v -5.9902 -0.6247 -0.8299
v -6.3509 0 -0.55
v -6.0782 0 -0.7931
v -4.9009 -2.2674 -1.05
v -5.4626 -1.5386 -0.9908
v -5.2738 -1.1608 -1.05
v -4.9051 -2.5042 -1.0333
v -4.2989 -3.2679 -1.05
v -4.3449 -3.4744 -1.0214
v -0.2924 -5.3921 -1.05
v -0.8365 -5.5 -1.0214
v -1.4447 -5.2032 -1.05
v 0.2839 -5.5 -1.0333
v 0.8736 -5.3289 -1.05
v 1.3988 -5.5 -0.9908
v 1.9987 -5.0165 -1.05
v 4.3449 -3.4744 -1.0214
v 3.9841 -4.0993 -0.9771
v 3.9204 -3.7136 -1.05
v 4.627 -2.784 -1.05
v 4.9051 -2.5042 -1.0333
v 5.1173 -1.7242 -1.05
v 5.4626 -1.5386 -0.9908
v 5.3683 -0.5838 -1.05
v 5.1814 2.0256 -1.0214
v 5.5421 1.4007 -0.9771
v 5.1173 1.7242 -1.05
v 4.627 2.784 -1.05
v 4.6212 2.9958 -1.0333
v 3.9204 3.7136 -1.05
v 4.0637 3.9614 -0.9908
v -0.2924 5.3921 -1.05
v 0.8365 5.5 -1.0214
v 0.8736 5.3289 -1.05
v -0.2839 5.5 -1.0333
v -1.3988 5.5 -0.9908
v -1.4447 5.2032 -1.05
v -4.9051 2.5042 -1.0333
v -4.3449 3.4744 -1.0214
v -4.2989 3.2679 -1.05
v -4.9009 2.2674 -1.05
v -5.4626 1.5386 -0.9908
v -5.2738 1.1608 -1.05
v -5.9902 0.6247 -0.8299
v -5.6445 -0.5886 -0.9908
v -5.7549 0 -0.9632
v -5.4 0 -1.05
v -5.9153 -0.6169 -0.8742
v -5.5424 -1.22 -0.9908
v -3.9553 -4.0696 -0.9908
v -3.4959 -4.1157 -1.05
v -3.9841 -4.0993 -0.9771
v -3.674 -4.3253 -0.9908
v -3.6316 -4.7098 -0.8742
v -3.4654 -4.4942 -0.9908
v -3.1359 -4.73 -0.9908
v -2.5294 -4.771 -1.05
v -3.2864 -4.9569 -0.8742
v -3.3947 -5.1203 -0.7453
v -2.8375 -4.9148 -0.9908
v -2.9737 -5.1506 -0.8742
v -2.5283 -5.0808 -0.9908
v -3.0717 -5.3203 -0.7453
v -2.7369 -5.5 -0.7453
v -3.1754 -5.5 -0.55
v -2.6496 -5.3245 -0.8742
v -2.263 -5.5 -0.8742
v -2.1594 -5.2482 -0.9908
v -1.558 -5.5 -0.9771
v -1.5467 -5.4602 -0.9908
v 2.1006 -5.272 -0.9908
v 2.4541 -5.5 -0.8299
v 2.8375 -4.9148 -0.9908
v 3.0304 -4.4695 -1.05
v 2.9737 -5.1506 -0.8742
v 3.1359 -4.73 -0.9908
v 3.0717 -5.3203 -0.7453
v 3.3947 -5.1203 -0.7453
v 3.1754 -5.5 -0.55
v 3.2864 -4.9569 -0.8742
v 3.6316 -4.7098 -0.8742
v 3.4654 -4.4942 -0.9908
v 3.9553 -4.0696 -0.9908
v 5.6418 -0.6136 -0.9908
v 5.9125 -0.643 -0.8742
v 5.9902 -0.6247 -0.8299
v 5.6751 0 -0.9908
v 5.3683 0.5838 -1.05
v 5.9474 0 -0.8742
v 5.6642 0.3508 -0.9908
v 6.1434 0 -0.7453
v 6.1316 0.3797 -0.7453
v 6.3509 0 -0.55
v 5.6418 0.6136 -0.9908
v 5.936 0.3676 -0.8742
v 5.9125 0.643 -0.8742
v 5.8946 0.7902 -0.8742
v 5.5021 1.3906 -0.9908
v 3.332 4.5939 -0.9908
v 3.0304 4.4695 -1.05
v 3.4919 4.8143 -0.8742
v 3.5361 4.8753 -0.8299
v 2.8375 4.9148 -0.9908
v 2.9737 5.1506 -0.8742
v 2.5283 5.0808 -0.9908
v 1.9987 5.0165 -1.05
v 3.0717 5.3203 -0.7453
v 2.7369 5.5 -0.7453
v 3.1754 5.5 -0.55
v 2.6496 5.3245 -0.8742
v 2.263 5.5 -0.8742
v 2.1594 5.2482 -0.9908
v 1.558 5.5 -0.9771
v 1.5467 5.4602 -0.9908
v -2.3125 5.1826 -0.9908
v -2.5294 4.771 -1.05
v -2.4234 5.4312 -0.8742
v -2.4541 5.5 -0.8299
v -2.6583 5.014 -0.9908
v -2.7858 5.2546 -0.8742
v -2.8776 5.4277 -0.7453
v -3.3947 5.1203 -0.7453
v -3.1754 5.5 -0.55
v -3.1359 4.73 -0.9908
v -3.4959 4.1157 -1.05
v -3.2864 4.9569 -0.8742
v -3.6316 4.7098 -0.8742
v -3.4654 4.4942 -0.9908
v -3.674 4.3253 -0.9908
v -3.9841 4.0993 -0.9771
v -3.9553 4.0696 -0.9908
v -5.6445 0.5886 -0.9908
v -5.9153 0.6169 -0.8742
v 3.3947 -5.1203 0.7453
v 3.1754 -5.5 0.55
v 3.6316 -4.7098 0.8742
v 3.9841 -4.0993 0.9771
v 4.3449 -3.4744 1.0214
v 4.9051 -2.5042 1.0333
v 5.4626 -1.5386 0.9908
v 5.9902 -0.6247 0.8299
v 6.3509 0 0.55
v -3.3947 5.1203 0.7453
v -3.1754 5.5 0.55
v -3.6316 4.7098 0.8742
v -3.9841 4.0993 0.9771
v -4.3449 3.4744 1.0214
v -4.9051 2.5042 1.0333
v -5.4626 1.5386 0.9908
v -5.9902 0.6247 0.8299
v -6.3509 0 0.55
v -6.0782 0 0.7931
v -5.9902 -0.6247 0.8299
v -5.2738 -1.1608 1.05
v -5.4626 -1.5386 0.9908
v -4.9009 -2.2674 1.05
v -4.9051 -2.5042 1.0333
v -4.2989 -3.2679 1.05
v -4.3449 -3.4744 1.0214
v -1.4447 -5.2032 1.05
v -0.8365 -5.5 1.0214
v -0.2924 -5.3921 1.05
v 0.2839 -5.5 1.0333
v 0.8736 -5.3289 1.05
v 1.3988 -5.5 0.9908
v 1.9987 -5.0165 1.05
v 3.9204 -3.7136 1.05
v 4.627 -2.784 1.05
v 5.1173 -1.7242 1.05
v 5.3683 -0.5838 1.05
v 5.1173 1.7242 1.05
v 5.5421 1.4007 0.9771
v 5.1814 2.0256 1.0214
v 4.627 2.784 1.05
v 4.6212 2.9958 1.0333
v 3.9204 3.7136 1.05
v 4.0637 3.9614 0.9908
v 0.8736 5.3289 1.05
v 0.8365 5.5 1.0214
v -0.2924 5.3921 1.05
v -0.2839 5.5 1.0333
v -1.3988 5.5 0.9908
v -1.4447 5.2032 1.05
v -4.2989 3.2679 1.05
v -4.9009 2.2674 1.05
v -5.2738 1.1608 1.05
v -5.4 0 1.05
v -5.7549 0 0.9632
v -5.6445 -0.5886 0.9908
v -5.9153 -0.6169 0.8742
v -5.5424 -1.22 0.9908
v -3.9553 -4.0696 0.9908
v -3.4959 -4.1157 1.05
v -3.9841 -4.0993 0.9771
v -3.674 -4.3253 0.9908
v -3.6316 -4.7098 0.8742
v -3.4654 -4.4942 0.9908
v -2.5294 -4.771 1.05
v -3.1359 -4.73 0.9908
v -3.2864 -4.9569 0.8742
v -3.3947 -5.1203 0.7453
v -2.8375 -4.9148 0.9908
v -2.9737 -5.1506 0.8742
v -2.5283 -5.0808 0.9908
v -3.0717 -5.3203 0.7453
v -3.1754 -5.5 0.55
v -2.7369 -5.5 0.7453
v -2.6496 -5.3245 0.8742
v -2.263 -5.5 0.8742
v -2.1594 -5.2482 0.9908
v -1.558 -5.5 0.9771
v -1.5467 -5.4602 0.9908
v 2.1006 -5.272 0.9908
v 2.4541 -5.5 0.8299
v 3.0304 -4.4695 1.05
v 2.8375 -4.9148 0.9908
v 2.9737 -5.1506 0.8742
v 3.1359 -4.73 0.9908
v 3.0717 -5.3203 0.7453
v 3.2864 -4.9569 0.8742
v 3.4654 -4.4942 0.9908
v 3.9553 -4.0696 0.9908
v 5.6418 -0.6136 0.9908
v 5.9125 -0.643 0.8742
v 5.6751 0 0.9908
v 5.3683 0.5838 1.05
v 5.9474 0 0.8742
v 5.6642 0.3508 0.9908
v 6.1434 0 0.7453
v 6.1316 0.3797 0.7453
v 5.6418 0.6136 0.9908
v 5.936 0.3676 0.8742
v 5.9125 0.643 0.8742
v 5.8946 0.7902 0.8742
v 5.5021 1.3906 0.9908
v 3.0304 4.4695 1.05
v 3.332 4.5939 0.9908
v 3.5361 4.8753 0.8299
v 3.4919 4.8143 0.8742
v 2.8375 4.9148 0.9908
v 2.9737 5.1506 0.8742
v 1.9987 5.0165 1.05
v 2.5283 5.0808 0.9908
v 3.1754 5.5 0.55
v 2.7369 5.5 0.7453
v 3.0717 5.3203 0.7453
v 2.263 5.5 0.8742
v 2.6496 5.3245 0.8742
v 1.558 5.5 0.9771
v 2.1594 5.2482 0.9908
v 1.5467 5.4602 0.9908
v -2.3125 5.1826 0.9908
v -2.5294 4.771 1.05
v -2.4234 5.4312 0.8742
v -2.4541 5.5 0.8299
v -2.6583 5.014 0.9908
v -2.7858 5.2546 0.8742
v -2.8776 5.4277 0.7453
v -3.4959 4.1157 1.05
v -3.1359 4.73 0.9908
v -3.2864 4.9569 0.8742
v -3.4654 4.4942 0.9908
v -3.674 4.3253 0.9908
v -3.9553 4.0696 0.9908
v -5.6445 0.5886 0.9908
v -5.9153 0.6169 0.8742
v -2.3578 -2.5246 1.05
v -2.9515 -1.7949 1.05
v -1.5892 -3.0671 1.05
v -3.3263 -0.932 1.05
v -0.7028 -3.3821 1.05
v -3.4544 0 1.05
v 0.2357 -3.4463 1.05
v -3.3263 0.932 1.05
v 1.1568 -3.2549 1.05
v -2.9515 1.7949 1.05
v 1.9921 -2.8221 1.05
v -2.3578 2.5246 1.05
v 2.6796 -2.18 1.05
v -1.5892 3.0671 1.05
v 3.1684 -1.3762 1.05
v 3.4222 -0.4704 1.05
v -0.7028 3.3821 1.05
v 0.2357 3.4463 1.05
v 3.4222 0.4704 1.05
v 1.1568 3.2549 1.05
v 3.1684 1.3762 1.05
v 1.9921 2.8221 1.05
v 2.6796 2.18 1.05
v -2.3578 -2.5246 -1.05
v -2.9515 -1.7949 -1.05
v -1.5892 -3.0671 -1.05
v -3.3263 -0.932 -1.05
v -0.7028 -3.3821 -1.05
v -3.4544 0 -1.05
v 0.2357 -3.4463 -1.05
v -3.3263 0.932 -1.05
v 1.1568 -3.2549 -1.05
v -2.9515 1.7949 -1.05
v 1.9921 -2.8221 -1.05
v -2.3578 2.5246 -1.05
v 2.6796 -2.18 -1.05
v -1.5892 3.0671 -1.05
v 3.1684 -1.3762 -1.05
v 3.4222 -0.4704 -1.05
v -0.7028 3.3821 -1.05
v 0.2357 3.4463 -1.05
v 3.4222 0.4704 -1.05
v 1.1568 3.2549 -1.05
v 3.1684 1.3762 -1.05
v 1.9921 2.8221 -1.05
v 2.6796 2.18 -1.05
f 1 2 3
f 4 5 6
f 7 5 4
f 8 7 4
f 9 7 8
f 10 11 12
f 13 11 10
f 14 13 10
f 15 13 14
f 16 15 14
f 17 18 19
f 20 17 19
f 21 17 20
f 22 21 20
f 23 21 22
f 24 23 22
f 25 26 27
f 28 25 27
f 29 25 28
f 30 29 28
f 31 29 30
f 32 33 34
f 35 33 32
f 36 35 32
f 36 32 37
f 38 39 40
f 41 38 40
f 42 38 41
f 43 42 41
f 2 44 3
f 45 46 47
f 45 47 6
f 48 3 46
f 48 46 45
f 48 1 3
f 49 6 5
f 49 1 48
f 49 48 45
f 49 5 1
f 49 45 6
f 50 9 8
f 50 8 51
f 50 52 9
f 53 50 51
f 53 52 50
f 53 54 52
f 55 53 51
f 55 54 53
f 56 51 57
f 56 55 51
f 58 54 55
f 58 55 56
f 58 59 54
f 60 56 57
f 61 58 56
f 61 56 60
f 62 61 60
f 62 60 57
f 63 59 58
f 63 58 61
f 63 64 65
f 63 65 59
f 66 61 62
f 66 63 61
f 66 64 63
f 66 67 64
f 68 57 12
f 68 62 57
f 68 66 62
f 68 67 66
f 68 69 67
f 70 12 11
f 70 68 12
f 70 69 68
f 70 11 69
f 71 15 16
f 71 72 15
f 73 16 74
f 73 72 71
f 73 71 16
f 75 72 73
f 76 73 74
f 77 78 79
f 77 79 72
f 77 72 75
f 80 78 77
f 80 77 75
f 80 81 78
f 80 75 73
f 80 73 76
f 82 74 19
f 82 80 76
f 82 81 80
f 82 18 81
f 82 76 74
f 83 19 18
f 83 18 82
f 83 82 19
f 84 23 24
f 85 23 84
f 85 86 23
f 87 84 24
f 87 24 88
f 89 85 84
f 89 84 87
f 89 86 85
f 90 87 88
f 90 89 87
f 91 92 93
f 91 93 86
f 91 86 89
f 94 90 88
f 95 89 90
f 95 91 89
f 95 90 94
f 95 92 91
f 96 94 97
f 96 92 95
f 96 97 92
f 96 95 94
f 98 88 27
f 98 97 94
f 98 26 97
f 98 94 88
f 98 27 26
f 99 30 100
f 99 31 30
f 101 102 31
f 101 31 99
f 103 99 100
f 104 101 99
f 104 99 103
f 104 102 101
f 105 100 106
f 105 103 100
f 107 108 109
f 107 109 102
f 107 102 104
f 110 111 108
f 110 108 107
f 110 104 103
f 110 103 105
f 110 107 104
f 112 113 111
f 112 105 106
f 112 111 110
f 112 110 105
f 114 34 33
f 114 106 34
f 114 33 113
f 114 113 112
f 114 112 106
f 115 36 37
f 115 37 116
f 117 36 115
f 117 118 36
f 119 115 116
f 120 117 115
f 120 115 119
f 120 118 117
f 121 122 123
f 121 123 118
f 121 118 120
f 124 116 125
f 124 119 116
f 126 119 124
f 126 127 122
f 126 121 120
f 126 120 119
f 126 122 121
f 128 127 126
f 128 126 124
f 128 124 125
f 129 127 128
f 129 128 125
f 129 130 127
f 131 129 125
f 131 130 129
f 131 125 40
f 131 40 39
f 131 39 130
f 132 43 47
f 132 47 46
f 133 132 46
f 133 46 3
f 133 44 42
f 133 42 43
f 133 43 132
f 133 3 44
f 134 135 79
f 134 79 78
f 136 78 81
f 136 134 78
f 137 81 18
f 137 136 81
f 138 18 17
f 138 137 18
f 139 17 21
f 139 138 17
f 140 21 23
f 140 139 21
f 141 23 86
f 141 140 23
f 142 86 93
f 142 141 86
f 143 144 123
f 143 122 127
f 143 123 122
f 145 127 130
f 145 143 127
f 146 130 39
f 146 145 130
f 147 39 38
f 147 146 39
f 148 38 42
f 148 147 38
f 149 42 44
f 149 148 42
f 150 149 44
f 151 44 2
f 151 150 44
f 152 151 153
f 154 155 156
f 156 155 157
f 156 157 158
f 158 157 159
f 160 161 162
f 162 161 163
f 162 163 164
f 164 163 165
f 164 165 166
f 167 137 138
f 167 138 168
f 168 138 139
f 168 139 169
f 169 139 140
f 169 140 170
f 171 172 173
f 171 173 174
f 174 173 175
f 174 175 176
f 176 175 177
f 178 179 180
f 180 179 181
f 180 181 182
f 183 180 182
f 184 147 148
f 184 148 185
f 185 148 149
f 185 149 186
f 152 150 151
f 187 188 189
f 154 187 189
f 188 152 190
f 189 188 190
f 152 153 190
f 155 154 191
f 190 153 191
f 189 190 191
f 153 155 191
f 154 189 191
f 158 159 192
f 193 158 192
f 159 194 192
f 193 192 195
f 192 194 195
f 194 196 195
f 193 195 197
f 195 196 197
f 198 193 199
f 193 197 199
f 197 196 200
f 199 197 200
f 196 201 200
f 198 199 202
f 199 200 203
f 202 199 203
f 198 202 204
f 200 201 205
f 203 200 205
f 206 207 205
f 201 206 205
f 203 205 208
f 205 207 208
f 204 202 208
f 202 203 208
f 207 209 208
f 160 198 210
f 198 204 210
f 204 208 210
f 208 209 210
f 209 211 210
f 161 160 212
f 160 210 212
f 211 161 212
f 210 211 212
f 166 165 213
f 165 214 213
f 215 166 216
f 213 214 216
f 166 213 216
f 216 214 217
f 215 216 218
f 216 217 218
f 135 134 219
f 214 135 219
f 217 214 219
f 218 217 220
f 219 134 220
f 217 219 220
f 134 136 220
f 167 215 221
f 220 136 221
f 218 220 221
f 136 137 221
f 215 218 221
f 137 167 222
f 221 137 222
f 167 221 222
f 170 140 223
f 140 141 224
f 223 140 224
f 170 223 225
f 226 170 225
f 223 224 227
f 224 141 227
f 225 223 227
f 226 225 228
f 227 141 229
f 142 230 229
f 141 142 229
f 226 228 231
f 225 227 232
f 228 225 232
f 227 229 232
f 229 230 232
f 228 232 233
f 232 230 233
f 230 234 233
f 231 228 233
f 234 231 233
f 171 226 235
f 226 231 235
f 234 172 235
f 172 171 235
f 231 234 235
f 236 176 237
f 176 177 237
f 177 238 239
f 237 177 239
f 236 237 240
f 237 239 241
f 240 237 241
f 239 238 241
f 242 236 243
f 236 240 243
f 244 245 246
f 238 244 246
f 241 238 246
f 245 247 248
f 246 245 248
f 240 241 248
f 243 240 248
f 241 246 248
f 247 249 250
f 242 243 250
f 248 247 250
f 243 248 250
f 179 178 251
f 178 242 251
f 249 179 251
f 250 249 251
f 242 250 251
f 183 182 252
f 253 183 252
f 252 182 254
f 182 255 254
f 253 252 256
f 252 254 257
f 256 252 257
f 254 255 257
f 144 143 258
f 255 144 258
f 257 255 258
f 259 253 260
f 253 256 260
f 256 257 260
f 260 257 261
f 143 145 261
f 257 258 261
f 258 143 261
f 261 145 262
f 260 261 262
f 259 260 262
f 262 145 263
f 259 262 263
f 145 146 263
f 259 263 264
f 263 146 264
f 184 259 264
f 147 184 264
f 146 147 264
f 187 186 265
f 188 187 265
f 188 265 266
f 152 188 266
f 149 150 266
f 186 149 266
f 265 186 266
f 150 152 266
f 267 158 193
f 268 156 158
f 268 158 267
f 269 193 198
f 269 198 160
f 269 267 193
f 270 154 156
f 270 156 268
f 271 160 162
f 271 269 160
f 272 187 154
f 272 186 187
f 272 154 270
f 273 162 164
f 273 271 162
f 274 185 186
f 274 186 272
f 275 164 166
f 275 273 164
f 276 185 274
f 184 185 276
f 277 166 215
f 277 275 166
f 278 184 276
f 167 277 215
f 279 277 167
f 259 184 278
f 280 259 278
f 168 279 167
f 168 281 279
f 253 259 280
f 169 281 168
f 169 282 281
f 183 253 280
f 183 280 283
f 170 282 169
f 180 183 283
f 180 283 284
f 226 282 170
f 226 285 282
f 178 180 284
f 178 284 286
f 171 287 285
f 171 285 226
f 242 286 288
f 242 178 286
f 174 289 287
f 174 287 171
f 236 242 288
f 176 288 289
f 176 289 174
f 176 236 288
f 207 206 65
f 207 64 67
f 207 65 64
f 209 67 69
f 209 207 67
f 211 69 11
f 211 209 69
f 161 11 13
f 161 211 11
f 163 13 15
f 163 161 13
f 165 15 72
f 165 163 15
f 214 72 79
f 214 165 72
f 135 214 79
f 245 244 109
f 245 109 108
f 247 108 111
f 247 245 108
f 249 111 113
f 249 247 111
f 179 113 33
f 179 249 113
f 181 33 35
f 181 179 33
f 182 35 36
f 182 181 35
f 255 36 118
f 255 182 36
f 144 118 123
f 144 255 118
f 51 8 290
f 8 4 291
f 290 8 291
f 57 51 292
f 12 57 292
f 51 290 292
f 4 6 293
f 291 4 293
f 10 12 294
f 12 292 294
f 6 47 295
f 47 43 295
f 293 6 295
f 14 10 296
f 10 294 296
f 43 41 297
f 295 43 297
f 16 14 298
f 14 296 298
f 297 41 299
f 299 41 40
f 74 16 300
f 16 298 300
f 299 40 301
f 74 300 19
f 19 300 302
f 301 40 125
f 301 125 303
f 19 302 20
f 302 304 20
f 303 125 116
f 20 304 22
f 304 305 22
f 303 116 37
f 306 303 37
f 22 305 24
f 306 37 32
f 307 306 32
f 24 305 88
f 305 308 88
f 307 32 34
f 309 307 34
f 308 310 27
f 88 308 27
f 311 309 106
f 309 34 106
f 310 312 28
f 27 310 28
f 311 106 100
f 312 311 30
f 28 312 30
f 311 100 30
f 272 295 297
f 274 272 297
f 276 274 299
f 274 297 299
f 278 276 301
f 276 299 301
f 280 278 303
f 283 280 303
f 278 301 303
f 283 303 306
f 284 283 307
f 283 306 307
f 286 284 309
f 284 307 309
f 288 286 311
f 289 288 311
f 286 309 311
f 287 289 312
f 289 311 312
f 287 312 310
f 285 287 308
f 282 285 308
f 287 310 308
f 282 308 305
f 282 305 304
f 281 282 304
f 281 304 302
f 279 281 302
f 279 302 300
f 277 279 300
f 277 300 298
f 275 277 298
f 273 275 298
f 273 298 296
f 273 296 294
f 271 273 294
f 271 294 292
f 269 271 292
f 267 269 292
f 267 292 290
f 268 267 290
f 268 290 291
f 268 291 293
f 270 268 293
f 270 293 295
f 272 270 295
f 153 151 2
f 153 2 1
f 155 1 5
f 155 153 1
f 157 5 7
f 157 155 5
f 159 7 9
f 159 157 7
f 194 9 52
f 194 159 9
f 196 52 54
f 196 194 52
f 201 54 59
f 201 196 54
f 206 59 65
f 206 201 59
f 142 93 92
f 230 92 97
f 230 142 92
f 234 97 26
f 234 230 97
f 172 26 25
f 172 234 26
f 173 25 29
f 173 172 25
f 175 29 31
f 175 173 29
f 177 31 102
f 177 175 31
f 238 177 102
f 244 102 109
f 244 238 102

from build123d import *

# Parameters (mm, degrees)
BOSS_EXTRUDE1_DEPTH      = 1.05
F_5_16_24_TAPPED_HOLE1_D = 6.9088


with BuildPart() as part:
    # Sketch2 → Boss-Extrude1 (new body, symmetric)
    with BuildSketch(Plane.XY):
        Polygon((-3.175426481, -5.5), (3.175426481, -5.5), (6.350852961, 0), (3.175426481, 5.5), (-3.175426481, 5.5), (-6.350852961, 0), align=None)
    extrude(amount=BOSS_EXTRUDE1_DEPTH, both=True)

    # 5/16-24 Tapped Hole1 (through all)
    with Locations(Plane.XY.offset(1.05)):
        with Locations((0, 0)):
            Hole(F_5_16_24_TAPPED_HOLE1_D / 2)

    # Sketch7 → Cut-Revolve2 (revolve, cut)
    with BuildSketch(Plane(origin=(0, 0, 0), x_dir=(1, 0, 0), z_dir=(0, 1, 0))):
        with BuildLine():
            Line((-6.350852961, -0.55), (-6.350852961, -1.05))
            Line((-6.350852961, -1.05), (-5.4, -1.05))
            ThreePointArc((-5.4, -1.05), (-5.921724154, -0.888044561), (-6.350852961, -0.55))
        make_face()
    cut_revolve2 = revolve(axis=Axis((0, 0, 0), (0, 0, 1)), mode=Mode.SUBTRACT)

    # Mirror1: Cut-Revolve2 across plane
    add(cut_revolve2.mirror(Plane.XY), mode=Mode.SUBTRACT)


solid = part.part
